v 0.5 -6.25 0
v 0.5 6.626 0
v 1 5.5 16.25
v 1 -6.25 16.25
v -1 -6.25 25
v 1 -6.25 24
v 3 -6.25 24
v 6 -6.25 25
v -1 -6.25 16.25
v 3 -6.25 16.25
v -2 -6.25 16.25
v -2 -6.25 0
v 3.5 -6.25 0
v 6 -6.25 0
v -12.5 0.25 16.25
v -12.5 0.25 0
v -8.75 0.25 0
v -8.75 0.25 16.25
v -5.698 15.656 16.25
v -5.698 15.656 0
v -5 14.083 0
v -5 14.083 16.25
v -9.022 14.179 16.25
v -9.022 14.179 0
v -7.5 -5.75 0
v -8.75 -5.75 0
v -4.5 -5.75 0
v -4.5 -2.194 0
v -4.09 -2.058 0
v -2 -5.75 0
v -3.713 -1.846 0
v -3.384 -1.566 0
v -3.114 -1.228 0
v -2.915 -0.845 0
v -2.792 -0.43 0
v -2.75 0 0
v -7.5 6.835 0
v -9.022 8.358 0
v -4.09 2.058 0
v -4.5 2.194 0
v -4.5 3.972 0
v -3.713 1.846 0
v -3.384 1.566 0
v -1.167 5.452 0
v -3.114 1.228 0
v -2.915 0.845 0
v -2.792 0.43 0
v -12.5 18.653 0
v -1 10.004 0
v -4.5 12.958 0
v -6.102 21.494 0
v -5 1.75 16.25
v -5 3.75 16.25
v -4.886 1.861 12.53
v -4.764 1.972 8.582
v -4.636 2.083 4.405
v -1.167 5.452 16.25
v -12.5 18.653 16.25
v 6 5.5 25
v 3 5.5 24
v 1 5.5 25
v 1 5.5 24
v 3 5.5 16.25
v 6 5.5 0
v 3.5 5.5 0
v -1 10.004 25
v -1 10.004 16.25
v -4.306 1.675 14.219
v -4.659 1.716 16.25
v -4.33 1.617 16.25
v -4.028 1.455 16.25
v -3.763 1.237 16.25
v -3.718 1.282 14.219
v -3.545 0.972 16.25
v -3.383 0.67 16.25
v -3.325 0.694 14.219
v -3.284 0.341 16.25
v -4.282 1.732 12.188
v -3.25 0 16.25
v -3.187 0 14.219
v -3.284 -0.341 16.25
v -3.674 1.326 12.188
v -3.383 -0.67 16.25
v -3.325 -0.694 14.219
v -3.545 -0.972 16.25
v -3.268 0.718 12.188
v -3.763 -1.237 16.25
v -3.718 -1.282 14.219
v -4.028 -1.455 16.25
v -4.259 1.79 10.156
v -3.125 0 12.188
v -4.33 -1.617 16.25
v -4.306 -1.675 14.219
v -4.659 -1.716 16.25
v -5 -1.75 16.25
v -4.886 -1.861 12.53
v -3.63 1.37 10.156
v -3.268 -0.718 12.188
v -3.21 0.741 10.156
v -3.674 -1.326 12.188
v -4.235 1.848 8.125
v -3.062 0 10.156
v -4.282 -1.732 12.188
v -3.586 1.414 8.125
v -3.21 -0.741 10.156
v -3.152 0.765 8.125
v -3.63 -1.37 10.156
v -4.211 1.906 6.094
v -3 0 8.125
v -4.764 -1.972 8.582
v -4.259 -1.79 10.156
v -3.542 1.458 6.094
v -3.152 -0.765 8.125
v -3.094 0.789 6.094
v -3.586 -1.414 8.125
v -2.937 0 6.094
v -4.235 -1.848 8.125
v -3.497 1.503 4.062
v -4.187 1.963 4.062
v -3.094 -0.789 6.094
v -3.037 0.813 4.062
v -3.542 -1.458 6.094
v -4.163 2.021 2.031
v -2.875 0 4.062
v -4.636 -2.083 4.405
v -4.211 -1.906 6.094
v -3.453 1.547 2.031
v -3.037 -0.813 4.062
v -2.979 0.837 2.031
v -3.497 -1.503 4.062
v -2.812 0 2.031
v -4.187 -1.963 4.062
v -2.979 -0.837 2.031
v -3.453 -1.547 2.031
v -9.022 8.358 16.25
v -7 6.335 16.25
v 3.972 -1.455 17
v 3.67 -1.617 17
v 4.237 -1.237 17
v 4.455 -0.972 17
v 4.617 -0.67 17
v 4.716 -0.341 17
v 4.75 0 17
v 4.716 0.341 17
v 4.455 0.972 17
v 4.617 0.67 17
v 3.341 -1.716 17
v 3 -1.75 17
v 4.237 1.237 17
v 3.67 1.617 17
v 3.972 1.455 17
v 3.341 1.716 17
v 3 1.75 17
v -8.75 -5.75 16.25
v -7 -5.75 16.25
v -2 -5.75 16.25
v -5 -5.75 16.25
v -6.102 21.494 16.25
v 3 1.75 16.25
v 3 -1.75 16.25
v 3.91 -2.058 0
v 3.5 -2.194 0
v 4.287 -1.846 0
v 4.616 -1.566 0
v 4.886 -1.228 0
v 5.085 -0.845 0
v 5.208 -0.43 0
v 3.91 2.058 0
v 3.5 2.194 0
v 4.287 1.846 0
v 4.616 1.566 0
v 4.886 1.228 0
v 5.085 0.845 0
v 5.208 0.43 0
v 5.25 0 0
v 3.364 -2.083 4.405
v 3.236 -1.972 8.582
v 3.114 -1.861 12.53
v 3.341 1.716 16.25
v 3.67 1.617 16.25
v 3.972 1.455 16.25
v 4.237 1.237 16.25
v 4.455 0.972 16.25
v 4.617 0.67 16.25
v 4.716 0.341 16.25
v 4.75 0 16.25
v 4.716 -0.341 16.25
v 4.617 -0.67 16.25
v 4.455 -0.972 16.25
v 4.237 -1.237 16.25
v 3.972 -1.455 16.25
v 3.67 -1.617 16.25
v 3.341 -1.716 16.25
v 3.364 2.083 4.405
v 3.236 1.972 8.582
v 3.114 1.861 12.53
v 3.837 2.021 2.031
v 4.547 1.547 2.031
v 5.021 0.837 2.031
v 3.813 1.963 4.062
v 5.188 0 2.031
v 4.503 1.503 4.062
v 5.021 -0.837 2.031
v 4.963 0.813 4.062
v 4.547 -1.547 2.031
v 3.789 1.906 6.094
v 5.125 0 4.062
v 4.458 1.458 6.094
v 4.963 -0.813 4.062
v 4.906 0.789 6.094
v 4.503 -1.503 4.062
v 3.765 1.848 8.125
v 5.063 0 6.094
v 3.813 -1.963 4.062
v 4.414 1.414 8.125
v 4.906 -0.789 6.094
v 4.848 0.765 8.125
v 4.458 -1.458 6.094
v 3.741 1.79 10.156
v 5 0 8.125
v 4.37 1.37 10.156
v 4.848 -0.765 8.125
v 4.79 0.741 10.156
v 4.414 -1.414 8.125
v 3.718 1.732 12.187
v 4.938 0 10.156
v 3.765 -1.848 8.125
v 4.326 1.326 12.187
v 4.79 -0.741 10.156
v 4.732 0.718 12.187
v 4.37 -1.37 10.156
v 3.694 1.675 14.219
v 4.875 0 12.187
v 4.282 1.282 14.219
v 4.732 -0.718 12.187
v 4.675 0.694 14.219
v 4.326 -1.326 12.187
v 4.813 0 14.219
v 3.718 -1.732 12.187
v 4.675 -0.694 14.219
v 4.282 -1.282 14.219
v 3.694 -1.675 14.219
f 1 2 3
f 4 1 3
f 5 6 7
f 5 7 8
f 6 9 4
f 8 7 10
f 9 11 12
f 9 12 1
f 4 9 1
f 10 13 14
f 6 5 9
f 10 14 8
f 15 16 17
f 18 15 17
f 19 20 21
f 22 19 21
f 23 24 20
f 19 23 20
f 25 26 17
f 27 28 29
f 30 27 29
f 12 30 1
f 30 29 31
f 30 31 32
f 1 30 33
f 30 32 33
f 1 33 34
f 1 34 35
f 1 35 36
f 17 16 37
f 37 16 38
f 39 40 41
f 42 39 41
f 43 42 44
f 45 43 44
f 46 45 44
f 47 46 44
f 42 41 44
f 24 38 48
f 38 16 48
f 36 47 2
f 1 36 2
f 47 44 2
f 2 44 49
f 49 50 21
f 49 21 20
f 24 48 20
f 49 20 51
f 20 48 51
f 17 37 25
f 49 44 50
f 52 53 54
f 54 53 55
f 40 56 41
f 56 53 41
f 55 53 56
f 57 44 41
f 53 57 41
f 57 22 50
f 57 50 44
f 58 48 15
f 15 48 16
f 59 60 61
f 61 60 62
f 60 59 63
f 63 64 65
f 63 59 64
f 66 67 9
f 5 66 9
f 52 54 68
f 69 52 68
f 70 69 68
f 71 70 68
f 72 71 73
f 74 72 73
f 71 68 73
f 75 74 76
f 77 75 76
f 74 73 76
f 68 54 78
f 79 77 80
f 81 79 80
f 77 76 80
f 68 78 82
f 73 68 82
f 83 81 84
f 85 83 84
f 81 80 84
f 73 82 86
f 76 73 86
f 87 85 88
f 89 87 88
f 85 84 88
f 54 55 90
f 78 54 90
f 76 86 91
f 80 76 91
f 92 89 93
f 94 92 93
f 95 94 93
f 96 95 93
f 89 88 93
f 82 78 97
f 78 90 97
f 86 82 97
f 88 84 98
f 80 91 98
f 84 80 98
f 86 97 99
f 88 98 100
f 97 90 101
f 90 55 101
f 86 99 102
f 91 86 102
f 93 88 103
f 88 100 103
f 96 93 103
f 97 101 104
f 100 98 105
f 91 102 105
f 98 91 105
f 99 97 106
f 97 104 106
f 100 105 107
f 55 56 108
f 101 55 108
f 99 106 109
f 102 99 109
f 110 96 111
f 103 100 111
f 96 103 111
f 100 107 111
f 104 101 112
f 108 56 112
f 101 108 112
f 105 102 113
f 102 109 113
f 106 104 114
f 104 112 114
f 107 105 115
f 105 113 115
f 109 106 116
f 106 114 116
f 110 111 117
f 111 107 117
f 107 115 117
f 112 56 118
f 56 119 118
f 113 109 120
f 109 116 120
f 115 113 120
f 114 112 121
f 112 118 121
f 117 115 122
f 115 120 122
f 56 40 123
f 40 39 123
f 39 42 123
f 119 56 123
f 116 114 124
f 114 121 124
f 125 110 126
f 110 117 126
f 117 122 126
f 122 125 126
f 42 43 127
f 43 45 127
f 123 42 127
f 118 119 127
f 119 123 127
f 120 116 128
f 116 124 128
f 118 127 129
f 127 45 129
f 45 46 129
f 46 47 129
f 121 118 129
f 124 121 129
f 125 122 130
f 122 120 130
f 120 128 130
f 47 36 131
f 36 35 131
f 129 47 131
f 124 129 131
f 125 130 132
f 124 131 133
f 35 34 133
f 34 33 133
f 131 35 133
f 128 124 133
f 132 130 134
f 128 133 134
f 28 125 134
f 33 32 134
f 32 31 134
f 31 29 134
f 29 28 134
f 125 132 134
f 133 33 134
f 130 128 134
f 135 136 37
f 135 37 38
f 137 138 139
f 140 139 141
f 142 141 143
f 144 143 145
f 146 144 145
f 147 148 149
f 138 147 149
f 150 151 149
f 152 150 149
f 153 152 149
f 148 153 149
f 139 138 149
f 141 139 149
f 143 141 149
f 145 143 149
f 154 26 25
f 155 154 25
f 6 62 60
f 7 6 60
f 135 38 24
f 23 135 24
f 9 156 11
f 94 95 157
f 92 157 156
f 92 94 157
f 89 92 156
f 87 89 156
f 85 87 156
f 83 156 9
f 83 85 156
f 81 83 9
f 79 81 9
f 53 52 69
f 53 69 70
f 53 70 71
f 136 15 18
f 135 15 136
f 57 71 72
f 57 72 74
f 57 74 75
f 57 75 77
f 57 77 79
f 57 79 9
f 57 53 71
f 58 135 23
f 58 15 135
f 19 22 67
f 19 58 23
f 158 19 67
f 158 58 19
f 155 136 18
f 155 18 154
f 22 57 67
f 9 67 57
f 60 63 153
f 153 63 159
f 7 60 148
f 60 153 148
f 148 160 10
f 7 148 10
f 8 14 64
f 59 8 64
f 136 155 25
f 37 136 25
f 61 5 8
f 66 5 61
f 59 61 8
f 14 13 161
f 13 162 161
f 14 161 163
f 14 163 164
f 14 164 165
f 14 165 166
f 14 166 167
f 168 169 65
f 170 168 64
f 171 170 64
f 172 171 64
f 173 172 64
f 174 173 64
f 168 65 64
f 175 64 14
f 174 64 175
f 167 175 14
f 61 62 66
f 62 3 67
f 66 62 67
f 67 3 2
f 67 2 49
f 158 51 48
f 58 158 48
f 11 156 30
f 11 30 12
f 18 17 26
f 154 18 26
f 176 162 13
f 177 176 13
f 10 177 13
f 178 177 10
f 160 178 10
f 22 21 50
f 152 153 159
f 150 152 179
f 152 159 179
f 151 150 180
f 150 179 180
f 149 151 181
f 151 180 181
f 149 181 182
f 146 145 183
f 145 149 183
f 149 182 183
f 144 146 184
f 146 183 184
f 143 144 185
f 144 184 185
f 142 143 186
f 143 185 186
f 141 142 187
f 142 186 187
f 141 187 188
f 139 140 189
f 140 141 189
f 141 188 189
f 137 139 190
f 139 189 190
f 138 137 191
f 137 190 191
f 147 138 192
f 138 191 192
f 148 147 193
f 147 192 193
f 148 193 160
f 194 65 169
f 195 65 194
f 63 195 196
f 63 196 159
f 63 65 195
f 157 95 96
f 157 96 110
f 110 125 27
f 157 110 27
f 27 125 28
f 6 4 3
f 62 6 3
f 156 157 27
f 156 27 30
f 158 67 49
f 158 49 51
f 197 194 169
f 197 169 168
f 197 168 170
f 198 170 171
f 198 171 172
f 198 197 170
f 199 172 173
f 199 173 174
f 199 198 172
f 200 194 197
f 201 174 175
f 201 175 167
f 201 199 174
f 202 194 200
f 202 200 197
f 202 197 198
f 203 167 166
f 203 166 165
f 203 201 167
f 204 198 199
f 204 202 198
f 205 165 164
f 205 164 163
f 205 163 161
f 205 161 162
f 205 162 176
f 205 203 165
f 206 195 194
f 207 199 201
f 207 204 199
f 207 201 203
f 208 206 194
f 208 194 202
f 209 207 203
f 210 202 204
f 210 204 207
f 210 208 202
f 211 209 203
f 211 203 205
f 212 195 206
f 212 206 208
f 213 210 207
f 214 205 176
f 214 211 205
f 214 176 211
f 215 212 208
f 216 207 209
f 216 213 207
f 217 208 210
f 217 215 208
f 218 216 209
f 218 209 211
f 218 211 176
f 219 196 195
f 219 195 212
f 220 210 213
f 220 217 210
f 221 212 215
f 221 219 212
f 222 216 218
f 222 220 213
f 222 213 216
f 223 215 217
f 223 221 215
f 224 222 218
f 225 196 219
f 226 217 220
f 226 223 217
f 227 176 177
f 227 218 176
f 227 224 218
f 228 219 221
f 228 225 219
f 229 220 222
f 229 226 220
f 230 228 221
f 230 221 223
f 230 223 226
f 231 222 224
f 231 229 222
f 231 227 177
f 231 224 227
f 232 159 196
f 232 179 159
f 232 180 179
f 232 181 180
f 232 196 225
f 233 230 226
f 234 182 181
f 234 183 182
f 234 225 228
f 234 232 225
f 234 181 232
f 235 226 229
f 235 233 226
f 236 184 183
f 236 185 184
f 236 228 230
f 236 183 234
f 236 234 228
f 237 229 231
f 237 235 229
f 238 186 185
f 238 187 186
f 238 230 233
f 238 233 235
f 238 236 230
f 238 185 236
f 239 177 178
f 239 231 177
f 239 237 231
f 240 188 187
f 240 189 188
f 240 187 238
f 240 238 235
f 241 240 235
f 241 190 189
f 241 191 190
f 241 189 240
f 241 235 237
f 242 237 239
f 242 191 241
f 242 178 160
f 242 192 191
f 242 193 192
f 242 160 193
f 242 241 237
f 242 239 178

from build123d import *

# Parameters (mm, degrees)
F1_DEPTH     = 16.25
F2_DEPTH     = 25
F3_START     = 24
F3_DEPTH     = 1
F4_START     = 17
F4_DEPTH     = 8
F5_T1_DEPTH  = 88.2485217467
F5_T3_DEPTH  = 96.2485217467
F5_T5_DEPTH  = 88.9985217467
F5_T10_DEPTH = 96.5839074706
F5_T15_DEPTH = 88.4985217467
F5_T20_DEPTH = 86.4985217467
F5_T23_ANGLE = 359.64
F5_T25_ANGLE = 359.64


# Not quite as in the source:
# - a fillet or chamfer that OpenCascade refuses, or shapes differently, is made with other operations: its cross-section is extruded or revolved along the edge and cut away or added


with BuildPart() as f1:
    # F0 (on Top) → F1 (new body)
    with BuildSketch(Plane.XY):
        with BuildLine():
            Line((-8.75, -5.75), (-7, -5.75))
            Line((-7, -5.75), (-7, 6.3353857239))
            Line((-7, 6.3353857239), (-9.0223743914, 8.3577601154))
            Line((-9.0223743914, 8.3577601154), (-9.0223743914, 14.1793463062))
            Line((-9.0223743914, 14.1793463062), (-5.6981157623, 15.6555524338))
            Line((-5.6981157623, 15.6555524338), (-1.1670593175, 5.4520969645))
            Line((-1.1670593175, 5.4520969645), (-5, 3.75))
            Line((-5, 3.75), (-5, 1.75))
            ThreePointArc((-5, 1.75), (-3.7625631329, 1.2374368671), (-3.25, 0))
            ThreePointArc((-3.25, 0), (-3.7625631329, -1.2374368671), (-5, -1.75))
            Line((-5, -1.75), (-5, -5.75))
            Line((-5, -5.75), (-2, -5.75))
            Line((-2, -5.75), (-2, -6.25))
            Line((-2, -6.25), (-1, -6.25))
            Line((-1, -6.25), (-1, 10.0037865203))
            Line((-1, 10.0037865203), (-6.1024322628, 21.4939193431))
            Line((-6.1024322628, 21.4939193431), (-12.5, 18.652946438))
            Line((-12.5, 18.652946438), (-12.5, 0.25))
            Line((-12.5, 0.25), (-8.75, 0.25))
            Line((-8.75, 0.25), (-8.75, -5.75))
        make_face()
    extrude(amount=F1_DEPTH)

    # F0 (on Top) → F2 (join)
    with BuildSketch(Plane.XY):
        Polygon((1, 5.5), (-1, 10.0037865203), (-1, -6.25), (1, -6.25), align=None)
    extrude(amount=F2_DEPTH)



with BuildPart() as f2:
    # F0 (on Top) → F2, piece 2 (new body)
    with BuildSketch(Plane.XY):
        with BuildLine():
            Line((6, 5.5), (3, 5.5))
            Line((3, 5.5), (3, 1.75))
            ThreePointArc((3, 1.75), (4.75, 0), (3, -1.75))
            Line((3, -1.75), (3, -6.25))
            Line((3, -6.25), (6, -6.25))
            Line((6, -6.25), (6, 5.5))
        make_face()
    extrude(amount=F2_DEPTH)


with BuildPart() as f1_1:
    add(f1.part)

    add(f2.part)  # F3 merges F2
    # F0 (on Top) → F3 (join)
    with BuildSketch(Plane.XY.offset(F3_START)):
        Polygon((3, 5.5), (1, 5.5), (1, -6.25), (3, -6.25), (3, -1.75), (3, 1.75), align=None)
    extrude(amount=F3_DEPTH)

    # F0 (on Top) → F4 (join)
    with BuildSketch(Plane.XY.offset(F4_START)):
        with BuildLine():
            ThreePointArc((3, -1.75), (4.75, 0), (3, 1.75))
            Line((3, 1.75), (3, -1.75))
        make_face()
    extrude(amount=F4_DEPTH)

    # F5: chamfer of 16.25 x 0.5 on 8 edges, made by hand

    # F5_s2 → F5_t1 (cut)
    with BuildSketch(Plane.XZ.offset(-47.7492608733)):
        Polygon((3.5, 0), (3, 16.25), (3, 0), align=None)
    extrude(amount=F5_T1_DEPTH, mode=Mode.SUBTRACT)

    # F5_s4 → F5_t3 (cut)
    with BuildSketch(Plane.XZ.offset(-47.7492608733)):
        Polygon((0.5, 0), (1, 16.25), (1, 0), align=None)
    extrude(amount=F5_T3_DEPTH, mode=Mode.SUBTRACT)

    # F5_s6 → F5_t5 (cut)
    with BuildSketch(Plane.XZ.offset(-40.4992608733)):
        Polygon((3.5, 0), (3, 16.25), (3, 0), align=None)
    extrude(amount=F5_T5_DEPTH, mode=Mode.SUBTRACT)


with BuildPart() as f5_tool8:
    # F5_s9 → F5_t10 (new body)
    with BuildSketch(Plane.XZ.offset(47.9992608733)):
        Polygon((-7, 16.25), (-7.5, 0), (-7, 0), align=None)
    extrude(amount=-F5_T10_DEPTH)

    split(bisect_by=Plane(origin=(-0.332307138, -0.332307138, 0), x_dir=(0, 0, 1), z_dir=(-0.7071067812, -0.7071067812, 0)), keep=Keep.TOP)


with BuildPart() as f1_2:
    add(f1_1.part)

    # F5_t7: cut F5_tool8
    add(f5_tool8.part, mode=Mode.SUBTRACT)


with BuildPart() as f5_tool13:
    # F5_s14 → F5_t15 (new body)
    with BuildSketch(Plane.XZ.offset(-40.4992608733)):
        Polygon((-5, 16.25), (-4.5, 0), (-5, 0), align=None)
    extrude(amount=F5_T15_DEPTH)

    split(bisect_by=Plane(origin=(1.0474931823, 0.4651611161, 0), x_dir=(0, 0, 1), z_dir=(-0.9139382482, -0.4058532722, 0)), keep=Keep.TOP)


with BuildPart() as f1_3:
    add(f1_2.part)

    # F5_t12: cut F5_tool13
    add(f5_tool13.part, mode=Mode.SUBTRACT)


with BuildPart() as f5_tool18:
    # F5_s19 → F5_t20 (new body)
    with BuildSketch(Plane.XZ.offset(-45.9992608733)):
        Polygon((-5, 16.25), (-4.5, 0), (-5, 0), align=None)
    extrude(amount=F5_T20_DEPTH)

    split(bisect_by=Plane(origin=(1.0474931823, 0.4651611161, 0), x_dir=(0, 0, 1), z_dir=(-0.9139382482, -0.4058532722, 0)), keep=Keep.TOP)


with BuildPart() as f1_4:
    add(f1_3.part)

    # F5_t17: cut F5_tool18
    add(f5_tool18.part, mode=Mode.SUBTRACT)

    # F5_s22 → F5_t23 (revolve, cut)
    with BuildSketch(Plane(origin=(-4.93479e-05, -0.0157078599, 0), x_dir=(0, 0, 1), z_dir=(-0.0031415875, -0.9999950652, 0))):
        Polygon((16.25, 6.749975326), (0, 7.249975326), (0, 6.749975326), align=None)
    revolve(axis=Axis((-5, 0, 0), (0, 0, -1)), revolution_arc=F5_T23_ANGLE, mode=Mode.SUBTRACT)

    # F5_s24 → F5_t25 (revolve, cut)
    with BuildSketch(Plane(origin=(2.96087e-05, 0.0094247159, 0), x_dir=(0, 0, 1), z_dir=(-0.0031415875, -0.9999950652, 0))):
        Polygon((0, -0.7499851956), (16.25, -1.2499851956), (0, -1.2499851956), align=None)
    revolve(axis=Axis((3, 0, 0), (0, 0, -1)), revolution_arc=F5_T25_ANGLE, mode=Mode.SUBTRACT)


solid = f1_4.part
